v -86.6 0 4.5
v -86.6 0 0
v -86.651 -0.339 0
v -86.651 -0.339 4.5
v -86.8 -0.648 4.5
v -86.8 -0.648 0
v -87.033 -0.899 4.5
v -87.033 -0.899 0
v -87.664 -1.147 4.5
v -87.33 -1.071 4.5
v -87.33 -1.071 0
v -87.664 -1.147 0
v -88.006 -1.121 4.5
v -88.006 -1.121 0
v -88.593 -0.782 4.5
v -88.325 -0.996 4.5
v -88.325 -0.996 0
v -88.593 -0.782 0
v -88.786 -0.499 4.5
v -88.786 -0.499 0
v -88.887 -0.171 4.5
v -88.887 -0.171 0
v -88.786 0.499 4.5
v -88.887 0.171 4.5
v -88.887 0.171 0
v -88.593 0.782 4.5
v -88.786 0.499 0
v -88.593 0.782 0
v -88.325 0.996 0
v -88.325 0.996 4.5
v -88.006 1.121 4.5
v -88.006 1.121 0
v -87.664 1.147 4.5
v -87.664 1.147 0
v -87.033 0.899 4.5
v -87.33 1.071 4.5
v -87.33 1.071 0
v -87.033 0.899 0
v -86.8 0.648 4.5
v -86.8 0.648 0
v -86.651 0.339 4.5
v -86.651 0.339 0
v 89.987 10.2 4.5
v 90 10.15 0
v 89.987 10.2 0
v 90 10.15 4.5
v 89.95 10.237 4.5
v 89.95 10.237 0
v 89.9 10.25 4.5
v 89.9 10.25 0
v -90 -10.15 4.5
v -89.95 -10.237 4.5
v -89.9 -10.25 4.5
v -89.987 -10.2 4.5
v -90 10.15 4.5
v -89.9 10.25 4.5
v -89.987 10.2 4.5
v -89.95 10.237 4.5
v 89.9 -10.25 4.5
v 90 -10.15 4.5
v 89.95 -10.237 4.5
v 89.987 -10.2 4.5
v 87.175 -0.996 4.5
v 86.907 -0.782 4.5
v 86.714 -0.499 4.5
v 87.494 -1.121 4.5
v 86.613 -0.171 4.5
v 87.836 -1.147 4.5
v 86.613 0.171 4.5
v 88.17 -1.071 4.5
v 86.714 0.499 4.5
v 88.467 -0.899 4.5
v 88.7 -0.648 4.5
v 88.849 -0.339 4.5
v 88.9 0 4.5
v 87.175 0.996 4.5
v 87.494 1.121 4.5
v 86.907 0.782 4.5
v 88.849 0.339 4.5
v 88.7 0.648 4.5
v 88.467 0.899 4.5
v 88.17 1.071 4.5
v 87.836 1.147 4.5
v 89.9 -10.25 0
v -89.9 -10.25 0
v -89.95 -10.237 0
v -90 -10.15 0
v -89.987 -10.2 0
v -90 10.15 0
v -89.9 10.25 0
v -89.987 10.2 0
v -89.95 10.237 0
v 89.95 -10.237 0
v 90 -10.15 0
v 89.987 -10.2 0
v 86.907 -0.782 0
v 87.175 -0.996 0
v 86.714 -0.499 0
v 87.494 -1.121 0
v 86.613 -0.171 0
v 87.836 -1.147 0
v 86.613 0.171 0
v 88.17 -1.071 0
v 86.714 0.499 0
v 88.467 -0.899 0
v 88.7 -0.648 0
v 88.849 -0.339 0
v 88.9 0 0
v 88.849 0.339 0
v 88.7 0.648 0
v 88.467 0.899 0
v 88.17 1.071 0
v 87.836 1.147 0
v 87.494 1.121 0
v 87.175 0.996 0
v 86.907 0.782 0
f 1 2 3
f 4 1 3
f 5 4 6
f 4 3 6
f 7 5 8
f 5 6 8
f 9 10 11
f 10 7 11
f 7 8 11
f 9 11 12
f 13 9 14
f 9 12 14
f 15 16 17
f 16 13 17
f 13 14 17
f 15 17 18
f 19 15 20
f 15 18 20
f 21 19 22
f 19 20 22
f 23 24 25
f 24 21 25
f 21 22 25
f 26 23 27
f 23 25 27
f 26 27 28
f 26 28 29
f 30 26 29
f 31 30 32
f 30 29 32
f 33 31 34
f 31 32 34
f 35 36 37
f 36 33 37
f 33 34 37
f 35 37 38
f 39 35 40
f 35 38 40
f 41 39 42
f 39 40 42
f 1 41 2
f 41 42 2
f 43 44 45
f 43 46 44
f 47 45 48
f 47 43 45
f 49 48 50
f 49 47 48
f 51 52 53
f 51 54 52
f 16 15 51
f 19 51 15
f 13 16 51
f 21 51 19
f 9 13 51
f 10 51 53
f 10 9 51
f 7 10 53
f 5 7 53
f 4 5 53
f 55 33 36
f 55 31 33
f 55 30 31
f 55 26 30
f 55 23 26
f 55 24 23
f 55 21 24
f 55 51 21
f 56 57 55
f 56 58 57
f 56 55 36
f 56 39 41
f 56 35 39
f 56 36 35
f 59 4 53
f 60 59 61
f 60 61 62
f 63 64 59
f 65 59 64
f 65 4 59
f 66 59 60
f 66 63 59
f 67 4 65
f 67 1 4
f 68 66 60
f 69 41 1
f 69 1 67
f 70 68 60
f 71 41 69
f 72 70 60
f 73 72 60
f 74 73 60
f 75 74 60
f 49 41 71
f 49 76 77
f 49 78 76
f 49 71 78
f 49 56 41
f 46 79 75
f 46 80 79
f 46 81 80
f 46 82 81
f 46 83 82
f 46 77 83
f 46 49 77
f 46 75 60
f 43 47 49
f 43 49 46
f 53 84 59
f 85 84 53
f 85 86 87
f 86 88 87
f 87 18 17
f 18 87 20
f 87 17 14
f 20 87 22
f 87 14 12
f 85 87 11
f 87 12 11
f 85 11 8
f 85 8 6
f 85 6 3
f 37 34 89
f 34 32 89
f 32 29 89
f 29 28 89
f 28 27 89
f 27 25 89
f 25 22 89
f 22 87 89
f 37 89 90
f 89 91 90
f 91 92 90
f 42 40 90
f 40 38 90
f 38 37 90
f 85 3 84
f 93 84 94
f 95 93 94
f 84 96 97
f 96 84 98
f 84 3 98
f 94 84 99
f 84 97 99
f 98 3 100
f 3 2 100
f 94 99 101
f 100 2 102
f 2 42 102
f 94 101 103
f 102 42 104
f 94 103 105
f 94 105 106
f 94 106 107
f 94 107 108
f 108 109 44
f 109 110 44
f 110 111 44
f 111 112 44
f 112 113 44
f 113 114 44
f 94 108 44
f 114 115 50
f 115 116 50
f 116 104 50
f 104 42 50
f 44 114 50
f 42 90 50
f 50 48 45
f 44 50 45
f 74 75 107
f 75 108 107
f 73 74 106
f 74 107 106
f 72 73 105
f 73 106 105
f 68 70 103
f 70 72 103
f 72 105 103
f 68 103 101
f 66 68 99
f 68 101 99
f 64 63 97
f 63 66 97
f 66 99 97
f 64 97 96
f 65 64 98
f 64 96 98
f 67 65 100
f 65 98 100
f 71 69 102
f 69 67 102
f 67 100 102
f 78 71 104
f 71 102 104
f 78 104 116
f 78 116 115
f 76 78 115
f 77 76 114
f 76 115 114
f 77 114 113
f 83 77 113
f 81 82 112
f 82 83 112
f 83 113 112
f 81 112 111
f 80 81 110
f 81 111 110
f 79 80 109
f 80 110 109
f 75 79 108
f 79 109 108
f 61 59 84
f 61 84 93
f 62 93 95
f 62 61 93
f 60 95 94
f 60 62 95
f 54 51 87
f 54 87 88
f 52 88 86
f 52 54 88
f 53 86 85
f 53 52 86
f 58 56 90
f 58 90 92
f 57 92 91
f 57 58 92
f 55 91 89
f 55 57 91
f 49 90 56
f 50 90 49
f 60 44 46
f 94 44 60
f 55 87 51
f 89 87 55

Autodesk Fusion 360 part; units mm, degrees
sketch "Sketch1" plane through (0, 0, 0) normal (0, 0, 1) x (1, 0, 0)
  line L0 (90, -10.25) -> (-90, -10.25)
  line L1 (-90, -10.25) -> (-90, 10.25)
  line L2 (-90, 10.25) -> (90, 10.25)
  line L3 (90, 10.25) -> (90, -10.25)
  line L4 (90, -10.25) -> (-90, 10.25) construction
  line L5 (-90, -10.25) -> (90, 10.25) construction
  line L6 (-87.75, 10.25) -> (-87.75, -10.25) construction
  line L7 (87.75, 10.25) -> (87.75, -10.25) construction
  circle A0 centre (-87.75, 0) radius 1.15
  circle A1 centre (87.75, 0) radius 1.15
  dimension "d1" = 180
  dimension "d2" = 20.5
  dimension "d3" = 2.25
  dimension "d4" = 2.25
  dimension "d5" = 2.3
  dimension "d6" = 2.3
extrude "Extrude1" add sketch "Sketch1" along normal blind 4.5
fillet "Fillet1" radius 0.1 4 edges at (90, -10.25, 2.25) (90, 10.25, 2.25) (-90, -10.25, 2.25) (-90, 10.25, 2.25)
